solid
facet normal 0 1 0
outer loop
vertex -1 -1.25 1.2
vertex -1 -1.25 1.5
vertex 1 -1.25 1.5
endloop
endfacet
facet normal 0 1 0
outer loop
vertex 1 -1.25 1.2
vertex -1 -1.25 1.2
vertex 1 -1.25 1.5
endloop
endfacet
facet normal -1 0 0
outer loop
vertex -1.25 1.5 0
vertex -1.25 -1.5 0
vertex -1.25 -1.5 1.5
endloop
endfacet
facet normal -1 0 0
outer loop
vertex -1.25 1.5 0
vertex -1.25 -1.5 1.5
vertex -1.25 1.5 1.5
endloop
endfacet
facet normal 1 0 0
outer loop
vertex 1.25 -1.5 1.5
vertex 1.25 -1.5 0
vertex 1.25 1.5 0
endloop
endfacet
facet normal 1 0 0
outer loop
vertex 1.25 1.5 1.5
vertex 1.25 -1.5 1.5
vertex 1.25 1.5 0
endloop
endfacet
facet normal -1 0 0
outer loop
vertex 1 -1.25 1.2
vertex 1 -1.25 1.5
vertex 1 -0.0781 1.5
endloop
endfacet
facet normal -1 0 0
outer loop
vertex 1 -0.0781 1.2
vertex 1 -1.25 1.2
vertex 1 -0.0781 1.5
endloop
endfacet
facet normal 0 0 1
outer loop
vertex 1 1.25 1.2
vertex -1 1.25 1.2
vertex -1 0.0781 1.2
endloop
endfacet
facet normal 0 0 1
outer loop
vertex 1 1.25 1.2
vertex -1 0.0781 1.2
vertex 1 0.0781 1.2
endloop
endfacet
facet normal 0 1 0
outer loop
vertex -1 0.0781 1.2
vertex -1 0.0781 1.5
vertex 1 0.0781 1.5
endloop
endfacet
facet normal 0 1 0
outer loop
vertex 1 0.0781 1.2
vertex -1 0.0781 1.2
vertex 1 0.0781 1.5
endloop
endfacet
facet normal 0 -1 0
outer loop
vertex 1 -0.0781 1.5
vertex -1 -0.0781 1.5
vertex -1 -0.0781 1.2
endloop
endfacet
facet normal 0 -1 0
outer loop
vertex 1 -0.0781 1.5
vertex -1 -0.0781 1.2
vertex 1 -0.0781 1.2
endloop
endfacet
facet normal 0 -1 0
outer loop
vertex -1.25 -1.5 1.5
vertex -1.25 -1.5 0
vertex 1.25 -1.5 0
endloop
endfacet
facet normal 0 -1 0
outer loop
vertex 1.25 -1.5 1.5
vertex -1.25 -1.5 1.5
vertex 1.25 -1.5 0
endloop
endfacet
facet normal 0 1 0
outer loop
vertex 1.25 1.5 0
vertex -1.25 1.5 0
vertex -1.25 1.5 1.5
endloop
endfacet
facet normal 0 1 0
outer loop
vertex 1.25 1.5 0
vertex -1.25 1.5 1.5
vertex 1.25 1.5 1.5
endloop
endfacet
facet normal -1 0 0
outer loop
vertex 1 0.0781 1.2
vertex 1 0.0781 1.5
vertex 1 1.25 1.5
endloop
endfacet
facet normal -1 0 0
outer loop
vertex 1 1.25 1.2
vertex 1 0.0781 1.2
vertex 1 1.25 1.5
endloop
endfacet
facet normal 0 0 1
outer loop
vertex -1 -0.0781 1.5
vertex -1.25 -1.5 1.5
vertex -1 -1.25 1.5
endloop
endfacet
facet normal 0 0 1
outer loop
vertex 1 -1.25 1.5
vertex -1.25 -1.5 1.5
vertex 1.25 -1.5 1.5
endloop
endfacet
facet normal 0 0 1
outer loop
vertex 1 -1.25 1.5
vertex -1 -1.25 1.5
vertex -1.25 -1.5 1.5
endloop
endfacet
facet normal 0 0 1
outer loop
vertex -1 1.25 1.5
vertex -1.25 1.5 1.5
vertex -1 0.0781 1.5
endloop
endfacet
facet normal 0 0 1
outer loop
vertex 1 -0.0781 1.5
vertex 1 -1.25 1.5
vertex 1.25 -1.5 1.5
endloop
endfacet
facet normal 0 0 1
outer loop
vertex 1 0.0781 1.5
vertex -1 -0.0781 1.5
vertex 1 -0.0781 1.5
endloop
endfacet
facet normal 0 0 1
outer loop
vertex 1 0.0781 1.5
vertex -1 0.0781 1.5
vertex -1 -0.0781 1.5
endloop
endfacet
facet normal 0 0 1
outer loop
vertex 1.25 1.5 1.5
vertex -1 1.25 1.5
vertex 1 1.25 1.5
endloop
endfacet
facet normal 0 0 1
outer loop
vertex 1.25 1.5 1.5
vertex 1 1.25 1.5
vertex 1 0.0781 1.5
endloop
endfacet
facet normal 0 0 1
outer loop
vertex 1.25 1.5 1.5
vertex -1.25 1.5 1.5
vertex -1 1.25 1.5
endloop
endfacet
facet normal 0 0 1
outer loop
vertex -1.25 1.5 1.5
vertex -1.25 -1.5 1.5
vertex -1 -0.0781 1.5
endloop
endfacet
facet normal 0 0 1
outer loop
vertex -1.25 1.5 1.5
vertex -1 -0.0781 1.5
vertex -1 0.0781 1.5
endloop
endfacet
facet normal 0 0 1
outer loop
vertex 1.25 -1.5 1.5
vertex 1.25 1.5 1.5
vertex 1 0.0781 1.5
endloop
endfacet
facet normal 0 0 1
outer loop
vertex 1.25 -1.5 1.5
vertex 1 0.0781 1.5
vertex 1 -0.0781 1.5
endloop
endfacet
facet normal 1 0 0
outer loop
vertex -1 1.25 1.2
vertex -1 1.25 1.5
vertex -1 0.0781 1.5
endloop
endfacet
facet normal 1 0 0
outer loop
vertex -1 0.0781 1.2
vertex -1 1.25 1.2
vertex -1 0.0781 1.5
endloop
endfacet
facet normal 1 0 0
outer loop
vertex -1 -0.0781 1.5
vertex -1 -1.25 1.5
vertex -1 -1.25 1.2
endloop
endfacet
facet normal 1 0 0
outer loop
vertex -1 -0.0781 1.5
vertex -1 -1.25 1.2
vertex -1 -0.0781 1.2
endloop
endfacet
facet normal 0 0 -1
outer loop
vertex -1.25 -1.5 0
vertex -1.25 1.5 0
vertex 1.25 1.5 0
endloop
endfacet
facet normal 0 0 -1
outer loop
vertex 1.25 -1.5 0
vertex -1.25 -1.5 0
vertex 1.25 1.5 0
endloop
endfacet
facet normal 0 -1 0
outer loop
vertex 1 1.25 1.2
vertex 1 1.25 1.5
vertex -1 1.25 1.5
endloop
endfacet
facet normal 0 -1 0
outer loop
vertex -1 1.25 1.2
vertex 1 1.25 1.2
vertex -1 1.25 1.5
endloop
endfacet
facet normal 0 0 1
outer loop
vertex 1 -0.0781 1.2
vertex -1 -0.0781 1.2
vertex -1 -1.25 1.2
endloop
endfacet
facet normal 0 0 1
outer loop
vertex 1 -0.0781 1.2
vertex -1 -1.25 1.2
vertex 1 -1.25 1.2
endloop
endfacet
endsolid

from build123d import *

# Parameters (mm, degrees)
CROQUIS2_W              = 2.5
CROQUIS2_H              = 3
SALIENTE_EXTRUIR1_DEPTH = 1.5
CROQUIS3_W              = 2
CROQUIS3_H              = 1.171875
CORTAR_EXTRUIR1_DEPTH   = 0.3


with BuildPart() as part:
    # Croquis2 → Saliente-Extruir1 (new body)
    with BuildSketch(Plane.XY):
        Rectangle(CROQUIS2_W, CROQUIS2_H)
    extrude(amount=SALIENTE_EXTRUIR1_DEPTH)

    # Croquis3 → Cortar-Extruir1 (cut)
    with BuildSketch(Plane.XY.offset(1.5)):
        Polygon((1, 1.25), (-1, 1.25), (-1, 0.078125), (1, 0.078125), (1, 0.15625), (1, 0.3125), (1, 0.625), align=None)
        with Locations((0, -0.6640625)):
            Rectangle(CROQUIS3_W, CROQUIS3_H)
    extrude(amount=-CORTAR_EXTRUIR1_DEPTH, mode=Mode.SUBTRACT)


solid = part.part
